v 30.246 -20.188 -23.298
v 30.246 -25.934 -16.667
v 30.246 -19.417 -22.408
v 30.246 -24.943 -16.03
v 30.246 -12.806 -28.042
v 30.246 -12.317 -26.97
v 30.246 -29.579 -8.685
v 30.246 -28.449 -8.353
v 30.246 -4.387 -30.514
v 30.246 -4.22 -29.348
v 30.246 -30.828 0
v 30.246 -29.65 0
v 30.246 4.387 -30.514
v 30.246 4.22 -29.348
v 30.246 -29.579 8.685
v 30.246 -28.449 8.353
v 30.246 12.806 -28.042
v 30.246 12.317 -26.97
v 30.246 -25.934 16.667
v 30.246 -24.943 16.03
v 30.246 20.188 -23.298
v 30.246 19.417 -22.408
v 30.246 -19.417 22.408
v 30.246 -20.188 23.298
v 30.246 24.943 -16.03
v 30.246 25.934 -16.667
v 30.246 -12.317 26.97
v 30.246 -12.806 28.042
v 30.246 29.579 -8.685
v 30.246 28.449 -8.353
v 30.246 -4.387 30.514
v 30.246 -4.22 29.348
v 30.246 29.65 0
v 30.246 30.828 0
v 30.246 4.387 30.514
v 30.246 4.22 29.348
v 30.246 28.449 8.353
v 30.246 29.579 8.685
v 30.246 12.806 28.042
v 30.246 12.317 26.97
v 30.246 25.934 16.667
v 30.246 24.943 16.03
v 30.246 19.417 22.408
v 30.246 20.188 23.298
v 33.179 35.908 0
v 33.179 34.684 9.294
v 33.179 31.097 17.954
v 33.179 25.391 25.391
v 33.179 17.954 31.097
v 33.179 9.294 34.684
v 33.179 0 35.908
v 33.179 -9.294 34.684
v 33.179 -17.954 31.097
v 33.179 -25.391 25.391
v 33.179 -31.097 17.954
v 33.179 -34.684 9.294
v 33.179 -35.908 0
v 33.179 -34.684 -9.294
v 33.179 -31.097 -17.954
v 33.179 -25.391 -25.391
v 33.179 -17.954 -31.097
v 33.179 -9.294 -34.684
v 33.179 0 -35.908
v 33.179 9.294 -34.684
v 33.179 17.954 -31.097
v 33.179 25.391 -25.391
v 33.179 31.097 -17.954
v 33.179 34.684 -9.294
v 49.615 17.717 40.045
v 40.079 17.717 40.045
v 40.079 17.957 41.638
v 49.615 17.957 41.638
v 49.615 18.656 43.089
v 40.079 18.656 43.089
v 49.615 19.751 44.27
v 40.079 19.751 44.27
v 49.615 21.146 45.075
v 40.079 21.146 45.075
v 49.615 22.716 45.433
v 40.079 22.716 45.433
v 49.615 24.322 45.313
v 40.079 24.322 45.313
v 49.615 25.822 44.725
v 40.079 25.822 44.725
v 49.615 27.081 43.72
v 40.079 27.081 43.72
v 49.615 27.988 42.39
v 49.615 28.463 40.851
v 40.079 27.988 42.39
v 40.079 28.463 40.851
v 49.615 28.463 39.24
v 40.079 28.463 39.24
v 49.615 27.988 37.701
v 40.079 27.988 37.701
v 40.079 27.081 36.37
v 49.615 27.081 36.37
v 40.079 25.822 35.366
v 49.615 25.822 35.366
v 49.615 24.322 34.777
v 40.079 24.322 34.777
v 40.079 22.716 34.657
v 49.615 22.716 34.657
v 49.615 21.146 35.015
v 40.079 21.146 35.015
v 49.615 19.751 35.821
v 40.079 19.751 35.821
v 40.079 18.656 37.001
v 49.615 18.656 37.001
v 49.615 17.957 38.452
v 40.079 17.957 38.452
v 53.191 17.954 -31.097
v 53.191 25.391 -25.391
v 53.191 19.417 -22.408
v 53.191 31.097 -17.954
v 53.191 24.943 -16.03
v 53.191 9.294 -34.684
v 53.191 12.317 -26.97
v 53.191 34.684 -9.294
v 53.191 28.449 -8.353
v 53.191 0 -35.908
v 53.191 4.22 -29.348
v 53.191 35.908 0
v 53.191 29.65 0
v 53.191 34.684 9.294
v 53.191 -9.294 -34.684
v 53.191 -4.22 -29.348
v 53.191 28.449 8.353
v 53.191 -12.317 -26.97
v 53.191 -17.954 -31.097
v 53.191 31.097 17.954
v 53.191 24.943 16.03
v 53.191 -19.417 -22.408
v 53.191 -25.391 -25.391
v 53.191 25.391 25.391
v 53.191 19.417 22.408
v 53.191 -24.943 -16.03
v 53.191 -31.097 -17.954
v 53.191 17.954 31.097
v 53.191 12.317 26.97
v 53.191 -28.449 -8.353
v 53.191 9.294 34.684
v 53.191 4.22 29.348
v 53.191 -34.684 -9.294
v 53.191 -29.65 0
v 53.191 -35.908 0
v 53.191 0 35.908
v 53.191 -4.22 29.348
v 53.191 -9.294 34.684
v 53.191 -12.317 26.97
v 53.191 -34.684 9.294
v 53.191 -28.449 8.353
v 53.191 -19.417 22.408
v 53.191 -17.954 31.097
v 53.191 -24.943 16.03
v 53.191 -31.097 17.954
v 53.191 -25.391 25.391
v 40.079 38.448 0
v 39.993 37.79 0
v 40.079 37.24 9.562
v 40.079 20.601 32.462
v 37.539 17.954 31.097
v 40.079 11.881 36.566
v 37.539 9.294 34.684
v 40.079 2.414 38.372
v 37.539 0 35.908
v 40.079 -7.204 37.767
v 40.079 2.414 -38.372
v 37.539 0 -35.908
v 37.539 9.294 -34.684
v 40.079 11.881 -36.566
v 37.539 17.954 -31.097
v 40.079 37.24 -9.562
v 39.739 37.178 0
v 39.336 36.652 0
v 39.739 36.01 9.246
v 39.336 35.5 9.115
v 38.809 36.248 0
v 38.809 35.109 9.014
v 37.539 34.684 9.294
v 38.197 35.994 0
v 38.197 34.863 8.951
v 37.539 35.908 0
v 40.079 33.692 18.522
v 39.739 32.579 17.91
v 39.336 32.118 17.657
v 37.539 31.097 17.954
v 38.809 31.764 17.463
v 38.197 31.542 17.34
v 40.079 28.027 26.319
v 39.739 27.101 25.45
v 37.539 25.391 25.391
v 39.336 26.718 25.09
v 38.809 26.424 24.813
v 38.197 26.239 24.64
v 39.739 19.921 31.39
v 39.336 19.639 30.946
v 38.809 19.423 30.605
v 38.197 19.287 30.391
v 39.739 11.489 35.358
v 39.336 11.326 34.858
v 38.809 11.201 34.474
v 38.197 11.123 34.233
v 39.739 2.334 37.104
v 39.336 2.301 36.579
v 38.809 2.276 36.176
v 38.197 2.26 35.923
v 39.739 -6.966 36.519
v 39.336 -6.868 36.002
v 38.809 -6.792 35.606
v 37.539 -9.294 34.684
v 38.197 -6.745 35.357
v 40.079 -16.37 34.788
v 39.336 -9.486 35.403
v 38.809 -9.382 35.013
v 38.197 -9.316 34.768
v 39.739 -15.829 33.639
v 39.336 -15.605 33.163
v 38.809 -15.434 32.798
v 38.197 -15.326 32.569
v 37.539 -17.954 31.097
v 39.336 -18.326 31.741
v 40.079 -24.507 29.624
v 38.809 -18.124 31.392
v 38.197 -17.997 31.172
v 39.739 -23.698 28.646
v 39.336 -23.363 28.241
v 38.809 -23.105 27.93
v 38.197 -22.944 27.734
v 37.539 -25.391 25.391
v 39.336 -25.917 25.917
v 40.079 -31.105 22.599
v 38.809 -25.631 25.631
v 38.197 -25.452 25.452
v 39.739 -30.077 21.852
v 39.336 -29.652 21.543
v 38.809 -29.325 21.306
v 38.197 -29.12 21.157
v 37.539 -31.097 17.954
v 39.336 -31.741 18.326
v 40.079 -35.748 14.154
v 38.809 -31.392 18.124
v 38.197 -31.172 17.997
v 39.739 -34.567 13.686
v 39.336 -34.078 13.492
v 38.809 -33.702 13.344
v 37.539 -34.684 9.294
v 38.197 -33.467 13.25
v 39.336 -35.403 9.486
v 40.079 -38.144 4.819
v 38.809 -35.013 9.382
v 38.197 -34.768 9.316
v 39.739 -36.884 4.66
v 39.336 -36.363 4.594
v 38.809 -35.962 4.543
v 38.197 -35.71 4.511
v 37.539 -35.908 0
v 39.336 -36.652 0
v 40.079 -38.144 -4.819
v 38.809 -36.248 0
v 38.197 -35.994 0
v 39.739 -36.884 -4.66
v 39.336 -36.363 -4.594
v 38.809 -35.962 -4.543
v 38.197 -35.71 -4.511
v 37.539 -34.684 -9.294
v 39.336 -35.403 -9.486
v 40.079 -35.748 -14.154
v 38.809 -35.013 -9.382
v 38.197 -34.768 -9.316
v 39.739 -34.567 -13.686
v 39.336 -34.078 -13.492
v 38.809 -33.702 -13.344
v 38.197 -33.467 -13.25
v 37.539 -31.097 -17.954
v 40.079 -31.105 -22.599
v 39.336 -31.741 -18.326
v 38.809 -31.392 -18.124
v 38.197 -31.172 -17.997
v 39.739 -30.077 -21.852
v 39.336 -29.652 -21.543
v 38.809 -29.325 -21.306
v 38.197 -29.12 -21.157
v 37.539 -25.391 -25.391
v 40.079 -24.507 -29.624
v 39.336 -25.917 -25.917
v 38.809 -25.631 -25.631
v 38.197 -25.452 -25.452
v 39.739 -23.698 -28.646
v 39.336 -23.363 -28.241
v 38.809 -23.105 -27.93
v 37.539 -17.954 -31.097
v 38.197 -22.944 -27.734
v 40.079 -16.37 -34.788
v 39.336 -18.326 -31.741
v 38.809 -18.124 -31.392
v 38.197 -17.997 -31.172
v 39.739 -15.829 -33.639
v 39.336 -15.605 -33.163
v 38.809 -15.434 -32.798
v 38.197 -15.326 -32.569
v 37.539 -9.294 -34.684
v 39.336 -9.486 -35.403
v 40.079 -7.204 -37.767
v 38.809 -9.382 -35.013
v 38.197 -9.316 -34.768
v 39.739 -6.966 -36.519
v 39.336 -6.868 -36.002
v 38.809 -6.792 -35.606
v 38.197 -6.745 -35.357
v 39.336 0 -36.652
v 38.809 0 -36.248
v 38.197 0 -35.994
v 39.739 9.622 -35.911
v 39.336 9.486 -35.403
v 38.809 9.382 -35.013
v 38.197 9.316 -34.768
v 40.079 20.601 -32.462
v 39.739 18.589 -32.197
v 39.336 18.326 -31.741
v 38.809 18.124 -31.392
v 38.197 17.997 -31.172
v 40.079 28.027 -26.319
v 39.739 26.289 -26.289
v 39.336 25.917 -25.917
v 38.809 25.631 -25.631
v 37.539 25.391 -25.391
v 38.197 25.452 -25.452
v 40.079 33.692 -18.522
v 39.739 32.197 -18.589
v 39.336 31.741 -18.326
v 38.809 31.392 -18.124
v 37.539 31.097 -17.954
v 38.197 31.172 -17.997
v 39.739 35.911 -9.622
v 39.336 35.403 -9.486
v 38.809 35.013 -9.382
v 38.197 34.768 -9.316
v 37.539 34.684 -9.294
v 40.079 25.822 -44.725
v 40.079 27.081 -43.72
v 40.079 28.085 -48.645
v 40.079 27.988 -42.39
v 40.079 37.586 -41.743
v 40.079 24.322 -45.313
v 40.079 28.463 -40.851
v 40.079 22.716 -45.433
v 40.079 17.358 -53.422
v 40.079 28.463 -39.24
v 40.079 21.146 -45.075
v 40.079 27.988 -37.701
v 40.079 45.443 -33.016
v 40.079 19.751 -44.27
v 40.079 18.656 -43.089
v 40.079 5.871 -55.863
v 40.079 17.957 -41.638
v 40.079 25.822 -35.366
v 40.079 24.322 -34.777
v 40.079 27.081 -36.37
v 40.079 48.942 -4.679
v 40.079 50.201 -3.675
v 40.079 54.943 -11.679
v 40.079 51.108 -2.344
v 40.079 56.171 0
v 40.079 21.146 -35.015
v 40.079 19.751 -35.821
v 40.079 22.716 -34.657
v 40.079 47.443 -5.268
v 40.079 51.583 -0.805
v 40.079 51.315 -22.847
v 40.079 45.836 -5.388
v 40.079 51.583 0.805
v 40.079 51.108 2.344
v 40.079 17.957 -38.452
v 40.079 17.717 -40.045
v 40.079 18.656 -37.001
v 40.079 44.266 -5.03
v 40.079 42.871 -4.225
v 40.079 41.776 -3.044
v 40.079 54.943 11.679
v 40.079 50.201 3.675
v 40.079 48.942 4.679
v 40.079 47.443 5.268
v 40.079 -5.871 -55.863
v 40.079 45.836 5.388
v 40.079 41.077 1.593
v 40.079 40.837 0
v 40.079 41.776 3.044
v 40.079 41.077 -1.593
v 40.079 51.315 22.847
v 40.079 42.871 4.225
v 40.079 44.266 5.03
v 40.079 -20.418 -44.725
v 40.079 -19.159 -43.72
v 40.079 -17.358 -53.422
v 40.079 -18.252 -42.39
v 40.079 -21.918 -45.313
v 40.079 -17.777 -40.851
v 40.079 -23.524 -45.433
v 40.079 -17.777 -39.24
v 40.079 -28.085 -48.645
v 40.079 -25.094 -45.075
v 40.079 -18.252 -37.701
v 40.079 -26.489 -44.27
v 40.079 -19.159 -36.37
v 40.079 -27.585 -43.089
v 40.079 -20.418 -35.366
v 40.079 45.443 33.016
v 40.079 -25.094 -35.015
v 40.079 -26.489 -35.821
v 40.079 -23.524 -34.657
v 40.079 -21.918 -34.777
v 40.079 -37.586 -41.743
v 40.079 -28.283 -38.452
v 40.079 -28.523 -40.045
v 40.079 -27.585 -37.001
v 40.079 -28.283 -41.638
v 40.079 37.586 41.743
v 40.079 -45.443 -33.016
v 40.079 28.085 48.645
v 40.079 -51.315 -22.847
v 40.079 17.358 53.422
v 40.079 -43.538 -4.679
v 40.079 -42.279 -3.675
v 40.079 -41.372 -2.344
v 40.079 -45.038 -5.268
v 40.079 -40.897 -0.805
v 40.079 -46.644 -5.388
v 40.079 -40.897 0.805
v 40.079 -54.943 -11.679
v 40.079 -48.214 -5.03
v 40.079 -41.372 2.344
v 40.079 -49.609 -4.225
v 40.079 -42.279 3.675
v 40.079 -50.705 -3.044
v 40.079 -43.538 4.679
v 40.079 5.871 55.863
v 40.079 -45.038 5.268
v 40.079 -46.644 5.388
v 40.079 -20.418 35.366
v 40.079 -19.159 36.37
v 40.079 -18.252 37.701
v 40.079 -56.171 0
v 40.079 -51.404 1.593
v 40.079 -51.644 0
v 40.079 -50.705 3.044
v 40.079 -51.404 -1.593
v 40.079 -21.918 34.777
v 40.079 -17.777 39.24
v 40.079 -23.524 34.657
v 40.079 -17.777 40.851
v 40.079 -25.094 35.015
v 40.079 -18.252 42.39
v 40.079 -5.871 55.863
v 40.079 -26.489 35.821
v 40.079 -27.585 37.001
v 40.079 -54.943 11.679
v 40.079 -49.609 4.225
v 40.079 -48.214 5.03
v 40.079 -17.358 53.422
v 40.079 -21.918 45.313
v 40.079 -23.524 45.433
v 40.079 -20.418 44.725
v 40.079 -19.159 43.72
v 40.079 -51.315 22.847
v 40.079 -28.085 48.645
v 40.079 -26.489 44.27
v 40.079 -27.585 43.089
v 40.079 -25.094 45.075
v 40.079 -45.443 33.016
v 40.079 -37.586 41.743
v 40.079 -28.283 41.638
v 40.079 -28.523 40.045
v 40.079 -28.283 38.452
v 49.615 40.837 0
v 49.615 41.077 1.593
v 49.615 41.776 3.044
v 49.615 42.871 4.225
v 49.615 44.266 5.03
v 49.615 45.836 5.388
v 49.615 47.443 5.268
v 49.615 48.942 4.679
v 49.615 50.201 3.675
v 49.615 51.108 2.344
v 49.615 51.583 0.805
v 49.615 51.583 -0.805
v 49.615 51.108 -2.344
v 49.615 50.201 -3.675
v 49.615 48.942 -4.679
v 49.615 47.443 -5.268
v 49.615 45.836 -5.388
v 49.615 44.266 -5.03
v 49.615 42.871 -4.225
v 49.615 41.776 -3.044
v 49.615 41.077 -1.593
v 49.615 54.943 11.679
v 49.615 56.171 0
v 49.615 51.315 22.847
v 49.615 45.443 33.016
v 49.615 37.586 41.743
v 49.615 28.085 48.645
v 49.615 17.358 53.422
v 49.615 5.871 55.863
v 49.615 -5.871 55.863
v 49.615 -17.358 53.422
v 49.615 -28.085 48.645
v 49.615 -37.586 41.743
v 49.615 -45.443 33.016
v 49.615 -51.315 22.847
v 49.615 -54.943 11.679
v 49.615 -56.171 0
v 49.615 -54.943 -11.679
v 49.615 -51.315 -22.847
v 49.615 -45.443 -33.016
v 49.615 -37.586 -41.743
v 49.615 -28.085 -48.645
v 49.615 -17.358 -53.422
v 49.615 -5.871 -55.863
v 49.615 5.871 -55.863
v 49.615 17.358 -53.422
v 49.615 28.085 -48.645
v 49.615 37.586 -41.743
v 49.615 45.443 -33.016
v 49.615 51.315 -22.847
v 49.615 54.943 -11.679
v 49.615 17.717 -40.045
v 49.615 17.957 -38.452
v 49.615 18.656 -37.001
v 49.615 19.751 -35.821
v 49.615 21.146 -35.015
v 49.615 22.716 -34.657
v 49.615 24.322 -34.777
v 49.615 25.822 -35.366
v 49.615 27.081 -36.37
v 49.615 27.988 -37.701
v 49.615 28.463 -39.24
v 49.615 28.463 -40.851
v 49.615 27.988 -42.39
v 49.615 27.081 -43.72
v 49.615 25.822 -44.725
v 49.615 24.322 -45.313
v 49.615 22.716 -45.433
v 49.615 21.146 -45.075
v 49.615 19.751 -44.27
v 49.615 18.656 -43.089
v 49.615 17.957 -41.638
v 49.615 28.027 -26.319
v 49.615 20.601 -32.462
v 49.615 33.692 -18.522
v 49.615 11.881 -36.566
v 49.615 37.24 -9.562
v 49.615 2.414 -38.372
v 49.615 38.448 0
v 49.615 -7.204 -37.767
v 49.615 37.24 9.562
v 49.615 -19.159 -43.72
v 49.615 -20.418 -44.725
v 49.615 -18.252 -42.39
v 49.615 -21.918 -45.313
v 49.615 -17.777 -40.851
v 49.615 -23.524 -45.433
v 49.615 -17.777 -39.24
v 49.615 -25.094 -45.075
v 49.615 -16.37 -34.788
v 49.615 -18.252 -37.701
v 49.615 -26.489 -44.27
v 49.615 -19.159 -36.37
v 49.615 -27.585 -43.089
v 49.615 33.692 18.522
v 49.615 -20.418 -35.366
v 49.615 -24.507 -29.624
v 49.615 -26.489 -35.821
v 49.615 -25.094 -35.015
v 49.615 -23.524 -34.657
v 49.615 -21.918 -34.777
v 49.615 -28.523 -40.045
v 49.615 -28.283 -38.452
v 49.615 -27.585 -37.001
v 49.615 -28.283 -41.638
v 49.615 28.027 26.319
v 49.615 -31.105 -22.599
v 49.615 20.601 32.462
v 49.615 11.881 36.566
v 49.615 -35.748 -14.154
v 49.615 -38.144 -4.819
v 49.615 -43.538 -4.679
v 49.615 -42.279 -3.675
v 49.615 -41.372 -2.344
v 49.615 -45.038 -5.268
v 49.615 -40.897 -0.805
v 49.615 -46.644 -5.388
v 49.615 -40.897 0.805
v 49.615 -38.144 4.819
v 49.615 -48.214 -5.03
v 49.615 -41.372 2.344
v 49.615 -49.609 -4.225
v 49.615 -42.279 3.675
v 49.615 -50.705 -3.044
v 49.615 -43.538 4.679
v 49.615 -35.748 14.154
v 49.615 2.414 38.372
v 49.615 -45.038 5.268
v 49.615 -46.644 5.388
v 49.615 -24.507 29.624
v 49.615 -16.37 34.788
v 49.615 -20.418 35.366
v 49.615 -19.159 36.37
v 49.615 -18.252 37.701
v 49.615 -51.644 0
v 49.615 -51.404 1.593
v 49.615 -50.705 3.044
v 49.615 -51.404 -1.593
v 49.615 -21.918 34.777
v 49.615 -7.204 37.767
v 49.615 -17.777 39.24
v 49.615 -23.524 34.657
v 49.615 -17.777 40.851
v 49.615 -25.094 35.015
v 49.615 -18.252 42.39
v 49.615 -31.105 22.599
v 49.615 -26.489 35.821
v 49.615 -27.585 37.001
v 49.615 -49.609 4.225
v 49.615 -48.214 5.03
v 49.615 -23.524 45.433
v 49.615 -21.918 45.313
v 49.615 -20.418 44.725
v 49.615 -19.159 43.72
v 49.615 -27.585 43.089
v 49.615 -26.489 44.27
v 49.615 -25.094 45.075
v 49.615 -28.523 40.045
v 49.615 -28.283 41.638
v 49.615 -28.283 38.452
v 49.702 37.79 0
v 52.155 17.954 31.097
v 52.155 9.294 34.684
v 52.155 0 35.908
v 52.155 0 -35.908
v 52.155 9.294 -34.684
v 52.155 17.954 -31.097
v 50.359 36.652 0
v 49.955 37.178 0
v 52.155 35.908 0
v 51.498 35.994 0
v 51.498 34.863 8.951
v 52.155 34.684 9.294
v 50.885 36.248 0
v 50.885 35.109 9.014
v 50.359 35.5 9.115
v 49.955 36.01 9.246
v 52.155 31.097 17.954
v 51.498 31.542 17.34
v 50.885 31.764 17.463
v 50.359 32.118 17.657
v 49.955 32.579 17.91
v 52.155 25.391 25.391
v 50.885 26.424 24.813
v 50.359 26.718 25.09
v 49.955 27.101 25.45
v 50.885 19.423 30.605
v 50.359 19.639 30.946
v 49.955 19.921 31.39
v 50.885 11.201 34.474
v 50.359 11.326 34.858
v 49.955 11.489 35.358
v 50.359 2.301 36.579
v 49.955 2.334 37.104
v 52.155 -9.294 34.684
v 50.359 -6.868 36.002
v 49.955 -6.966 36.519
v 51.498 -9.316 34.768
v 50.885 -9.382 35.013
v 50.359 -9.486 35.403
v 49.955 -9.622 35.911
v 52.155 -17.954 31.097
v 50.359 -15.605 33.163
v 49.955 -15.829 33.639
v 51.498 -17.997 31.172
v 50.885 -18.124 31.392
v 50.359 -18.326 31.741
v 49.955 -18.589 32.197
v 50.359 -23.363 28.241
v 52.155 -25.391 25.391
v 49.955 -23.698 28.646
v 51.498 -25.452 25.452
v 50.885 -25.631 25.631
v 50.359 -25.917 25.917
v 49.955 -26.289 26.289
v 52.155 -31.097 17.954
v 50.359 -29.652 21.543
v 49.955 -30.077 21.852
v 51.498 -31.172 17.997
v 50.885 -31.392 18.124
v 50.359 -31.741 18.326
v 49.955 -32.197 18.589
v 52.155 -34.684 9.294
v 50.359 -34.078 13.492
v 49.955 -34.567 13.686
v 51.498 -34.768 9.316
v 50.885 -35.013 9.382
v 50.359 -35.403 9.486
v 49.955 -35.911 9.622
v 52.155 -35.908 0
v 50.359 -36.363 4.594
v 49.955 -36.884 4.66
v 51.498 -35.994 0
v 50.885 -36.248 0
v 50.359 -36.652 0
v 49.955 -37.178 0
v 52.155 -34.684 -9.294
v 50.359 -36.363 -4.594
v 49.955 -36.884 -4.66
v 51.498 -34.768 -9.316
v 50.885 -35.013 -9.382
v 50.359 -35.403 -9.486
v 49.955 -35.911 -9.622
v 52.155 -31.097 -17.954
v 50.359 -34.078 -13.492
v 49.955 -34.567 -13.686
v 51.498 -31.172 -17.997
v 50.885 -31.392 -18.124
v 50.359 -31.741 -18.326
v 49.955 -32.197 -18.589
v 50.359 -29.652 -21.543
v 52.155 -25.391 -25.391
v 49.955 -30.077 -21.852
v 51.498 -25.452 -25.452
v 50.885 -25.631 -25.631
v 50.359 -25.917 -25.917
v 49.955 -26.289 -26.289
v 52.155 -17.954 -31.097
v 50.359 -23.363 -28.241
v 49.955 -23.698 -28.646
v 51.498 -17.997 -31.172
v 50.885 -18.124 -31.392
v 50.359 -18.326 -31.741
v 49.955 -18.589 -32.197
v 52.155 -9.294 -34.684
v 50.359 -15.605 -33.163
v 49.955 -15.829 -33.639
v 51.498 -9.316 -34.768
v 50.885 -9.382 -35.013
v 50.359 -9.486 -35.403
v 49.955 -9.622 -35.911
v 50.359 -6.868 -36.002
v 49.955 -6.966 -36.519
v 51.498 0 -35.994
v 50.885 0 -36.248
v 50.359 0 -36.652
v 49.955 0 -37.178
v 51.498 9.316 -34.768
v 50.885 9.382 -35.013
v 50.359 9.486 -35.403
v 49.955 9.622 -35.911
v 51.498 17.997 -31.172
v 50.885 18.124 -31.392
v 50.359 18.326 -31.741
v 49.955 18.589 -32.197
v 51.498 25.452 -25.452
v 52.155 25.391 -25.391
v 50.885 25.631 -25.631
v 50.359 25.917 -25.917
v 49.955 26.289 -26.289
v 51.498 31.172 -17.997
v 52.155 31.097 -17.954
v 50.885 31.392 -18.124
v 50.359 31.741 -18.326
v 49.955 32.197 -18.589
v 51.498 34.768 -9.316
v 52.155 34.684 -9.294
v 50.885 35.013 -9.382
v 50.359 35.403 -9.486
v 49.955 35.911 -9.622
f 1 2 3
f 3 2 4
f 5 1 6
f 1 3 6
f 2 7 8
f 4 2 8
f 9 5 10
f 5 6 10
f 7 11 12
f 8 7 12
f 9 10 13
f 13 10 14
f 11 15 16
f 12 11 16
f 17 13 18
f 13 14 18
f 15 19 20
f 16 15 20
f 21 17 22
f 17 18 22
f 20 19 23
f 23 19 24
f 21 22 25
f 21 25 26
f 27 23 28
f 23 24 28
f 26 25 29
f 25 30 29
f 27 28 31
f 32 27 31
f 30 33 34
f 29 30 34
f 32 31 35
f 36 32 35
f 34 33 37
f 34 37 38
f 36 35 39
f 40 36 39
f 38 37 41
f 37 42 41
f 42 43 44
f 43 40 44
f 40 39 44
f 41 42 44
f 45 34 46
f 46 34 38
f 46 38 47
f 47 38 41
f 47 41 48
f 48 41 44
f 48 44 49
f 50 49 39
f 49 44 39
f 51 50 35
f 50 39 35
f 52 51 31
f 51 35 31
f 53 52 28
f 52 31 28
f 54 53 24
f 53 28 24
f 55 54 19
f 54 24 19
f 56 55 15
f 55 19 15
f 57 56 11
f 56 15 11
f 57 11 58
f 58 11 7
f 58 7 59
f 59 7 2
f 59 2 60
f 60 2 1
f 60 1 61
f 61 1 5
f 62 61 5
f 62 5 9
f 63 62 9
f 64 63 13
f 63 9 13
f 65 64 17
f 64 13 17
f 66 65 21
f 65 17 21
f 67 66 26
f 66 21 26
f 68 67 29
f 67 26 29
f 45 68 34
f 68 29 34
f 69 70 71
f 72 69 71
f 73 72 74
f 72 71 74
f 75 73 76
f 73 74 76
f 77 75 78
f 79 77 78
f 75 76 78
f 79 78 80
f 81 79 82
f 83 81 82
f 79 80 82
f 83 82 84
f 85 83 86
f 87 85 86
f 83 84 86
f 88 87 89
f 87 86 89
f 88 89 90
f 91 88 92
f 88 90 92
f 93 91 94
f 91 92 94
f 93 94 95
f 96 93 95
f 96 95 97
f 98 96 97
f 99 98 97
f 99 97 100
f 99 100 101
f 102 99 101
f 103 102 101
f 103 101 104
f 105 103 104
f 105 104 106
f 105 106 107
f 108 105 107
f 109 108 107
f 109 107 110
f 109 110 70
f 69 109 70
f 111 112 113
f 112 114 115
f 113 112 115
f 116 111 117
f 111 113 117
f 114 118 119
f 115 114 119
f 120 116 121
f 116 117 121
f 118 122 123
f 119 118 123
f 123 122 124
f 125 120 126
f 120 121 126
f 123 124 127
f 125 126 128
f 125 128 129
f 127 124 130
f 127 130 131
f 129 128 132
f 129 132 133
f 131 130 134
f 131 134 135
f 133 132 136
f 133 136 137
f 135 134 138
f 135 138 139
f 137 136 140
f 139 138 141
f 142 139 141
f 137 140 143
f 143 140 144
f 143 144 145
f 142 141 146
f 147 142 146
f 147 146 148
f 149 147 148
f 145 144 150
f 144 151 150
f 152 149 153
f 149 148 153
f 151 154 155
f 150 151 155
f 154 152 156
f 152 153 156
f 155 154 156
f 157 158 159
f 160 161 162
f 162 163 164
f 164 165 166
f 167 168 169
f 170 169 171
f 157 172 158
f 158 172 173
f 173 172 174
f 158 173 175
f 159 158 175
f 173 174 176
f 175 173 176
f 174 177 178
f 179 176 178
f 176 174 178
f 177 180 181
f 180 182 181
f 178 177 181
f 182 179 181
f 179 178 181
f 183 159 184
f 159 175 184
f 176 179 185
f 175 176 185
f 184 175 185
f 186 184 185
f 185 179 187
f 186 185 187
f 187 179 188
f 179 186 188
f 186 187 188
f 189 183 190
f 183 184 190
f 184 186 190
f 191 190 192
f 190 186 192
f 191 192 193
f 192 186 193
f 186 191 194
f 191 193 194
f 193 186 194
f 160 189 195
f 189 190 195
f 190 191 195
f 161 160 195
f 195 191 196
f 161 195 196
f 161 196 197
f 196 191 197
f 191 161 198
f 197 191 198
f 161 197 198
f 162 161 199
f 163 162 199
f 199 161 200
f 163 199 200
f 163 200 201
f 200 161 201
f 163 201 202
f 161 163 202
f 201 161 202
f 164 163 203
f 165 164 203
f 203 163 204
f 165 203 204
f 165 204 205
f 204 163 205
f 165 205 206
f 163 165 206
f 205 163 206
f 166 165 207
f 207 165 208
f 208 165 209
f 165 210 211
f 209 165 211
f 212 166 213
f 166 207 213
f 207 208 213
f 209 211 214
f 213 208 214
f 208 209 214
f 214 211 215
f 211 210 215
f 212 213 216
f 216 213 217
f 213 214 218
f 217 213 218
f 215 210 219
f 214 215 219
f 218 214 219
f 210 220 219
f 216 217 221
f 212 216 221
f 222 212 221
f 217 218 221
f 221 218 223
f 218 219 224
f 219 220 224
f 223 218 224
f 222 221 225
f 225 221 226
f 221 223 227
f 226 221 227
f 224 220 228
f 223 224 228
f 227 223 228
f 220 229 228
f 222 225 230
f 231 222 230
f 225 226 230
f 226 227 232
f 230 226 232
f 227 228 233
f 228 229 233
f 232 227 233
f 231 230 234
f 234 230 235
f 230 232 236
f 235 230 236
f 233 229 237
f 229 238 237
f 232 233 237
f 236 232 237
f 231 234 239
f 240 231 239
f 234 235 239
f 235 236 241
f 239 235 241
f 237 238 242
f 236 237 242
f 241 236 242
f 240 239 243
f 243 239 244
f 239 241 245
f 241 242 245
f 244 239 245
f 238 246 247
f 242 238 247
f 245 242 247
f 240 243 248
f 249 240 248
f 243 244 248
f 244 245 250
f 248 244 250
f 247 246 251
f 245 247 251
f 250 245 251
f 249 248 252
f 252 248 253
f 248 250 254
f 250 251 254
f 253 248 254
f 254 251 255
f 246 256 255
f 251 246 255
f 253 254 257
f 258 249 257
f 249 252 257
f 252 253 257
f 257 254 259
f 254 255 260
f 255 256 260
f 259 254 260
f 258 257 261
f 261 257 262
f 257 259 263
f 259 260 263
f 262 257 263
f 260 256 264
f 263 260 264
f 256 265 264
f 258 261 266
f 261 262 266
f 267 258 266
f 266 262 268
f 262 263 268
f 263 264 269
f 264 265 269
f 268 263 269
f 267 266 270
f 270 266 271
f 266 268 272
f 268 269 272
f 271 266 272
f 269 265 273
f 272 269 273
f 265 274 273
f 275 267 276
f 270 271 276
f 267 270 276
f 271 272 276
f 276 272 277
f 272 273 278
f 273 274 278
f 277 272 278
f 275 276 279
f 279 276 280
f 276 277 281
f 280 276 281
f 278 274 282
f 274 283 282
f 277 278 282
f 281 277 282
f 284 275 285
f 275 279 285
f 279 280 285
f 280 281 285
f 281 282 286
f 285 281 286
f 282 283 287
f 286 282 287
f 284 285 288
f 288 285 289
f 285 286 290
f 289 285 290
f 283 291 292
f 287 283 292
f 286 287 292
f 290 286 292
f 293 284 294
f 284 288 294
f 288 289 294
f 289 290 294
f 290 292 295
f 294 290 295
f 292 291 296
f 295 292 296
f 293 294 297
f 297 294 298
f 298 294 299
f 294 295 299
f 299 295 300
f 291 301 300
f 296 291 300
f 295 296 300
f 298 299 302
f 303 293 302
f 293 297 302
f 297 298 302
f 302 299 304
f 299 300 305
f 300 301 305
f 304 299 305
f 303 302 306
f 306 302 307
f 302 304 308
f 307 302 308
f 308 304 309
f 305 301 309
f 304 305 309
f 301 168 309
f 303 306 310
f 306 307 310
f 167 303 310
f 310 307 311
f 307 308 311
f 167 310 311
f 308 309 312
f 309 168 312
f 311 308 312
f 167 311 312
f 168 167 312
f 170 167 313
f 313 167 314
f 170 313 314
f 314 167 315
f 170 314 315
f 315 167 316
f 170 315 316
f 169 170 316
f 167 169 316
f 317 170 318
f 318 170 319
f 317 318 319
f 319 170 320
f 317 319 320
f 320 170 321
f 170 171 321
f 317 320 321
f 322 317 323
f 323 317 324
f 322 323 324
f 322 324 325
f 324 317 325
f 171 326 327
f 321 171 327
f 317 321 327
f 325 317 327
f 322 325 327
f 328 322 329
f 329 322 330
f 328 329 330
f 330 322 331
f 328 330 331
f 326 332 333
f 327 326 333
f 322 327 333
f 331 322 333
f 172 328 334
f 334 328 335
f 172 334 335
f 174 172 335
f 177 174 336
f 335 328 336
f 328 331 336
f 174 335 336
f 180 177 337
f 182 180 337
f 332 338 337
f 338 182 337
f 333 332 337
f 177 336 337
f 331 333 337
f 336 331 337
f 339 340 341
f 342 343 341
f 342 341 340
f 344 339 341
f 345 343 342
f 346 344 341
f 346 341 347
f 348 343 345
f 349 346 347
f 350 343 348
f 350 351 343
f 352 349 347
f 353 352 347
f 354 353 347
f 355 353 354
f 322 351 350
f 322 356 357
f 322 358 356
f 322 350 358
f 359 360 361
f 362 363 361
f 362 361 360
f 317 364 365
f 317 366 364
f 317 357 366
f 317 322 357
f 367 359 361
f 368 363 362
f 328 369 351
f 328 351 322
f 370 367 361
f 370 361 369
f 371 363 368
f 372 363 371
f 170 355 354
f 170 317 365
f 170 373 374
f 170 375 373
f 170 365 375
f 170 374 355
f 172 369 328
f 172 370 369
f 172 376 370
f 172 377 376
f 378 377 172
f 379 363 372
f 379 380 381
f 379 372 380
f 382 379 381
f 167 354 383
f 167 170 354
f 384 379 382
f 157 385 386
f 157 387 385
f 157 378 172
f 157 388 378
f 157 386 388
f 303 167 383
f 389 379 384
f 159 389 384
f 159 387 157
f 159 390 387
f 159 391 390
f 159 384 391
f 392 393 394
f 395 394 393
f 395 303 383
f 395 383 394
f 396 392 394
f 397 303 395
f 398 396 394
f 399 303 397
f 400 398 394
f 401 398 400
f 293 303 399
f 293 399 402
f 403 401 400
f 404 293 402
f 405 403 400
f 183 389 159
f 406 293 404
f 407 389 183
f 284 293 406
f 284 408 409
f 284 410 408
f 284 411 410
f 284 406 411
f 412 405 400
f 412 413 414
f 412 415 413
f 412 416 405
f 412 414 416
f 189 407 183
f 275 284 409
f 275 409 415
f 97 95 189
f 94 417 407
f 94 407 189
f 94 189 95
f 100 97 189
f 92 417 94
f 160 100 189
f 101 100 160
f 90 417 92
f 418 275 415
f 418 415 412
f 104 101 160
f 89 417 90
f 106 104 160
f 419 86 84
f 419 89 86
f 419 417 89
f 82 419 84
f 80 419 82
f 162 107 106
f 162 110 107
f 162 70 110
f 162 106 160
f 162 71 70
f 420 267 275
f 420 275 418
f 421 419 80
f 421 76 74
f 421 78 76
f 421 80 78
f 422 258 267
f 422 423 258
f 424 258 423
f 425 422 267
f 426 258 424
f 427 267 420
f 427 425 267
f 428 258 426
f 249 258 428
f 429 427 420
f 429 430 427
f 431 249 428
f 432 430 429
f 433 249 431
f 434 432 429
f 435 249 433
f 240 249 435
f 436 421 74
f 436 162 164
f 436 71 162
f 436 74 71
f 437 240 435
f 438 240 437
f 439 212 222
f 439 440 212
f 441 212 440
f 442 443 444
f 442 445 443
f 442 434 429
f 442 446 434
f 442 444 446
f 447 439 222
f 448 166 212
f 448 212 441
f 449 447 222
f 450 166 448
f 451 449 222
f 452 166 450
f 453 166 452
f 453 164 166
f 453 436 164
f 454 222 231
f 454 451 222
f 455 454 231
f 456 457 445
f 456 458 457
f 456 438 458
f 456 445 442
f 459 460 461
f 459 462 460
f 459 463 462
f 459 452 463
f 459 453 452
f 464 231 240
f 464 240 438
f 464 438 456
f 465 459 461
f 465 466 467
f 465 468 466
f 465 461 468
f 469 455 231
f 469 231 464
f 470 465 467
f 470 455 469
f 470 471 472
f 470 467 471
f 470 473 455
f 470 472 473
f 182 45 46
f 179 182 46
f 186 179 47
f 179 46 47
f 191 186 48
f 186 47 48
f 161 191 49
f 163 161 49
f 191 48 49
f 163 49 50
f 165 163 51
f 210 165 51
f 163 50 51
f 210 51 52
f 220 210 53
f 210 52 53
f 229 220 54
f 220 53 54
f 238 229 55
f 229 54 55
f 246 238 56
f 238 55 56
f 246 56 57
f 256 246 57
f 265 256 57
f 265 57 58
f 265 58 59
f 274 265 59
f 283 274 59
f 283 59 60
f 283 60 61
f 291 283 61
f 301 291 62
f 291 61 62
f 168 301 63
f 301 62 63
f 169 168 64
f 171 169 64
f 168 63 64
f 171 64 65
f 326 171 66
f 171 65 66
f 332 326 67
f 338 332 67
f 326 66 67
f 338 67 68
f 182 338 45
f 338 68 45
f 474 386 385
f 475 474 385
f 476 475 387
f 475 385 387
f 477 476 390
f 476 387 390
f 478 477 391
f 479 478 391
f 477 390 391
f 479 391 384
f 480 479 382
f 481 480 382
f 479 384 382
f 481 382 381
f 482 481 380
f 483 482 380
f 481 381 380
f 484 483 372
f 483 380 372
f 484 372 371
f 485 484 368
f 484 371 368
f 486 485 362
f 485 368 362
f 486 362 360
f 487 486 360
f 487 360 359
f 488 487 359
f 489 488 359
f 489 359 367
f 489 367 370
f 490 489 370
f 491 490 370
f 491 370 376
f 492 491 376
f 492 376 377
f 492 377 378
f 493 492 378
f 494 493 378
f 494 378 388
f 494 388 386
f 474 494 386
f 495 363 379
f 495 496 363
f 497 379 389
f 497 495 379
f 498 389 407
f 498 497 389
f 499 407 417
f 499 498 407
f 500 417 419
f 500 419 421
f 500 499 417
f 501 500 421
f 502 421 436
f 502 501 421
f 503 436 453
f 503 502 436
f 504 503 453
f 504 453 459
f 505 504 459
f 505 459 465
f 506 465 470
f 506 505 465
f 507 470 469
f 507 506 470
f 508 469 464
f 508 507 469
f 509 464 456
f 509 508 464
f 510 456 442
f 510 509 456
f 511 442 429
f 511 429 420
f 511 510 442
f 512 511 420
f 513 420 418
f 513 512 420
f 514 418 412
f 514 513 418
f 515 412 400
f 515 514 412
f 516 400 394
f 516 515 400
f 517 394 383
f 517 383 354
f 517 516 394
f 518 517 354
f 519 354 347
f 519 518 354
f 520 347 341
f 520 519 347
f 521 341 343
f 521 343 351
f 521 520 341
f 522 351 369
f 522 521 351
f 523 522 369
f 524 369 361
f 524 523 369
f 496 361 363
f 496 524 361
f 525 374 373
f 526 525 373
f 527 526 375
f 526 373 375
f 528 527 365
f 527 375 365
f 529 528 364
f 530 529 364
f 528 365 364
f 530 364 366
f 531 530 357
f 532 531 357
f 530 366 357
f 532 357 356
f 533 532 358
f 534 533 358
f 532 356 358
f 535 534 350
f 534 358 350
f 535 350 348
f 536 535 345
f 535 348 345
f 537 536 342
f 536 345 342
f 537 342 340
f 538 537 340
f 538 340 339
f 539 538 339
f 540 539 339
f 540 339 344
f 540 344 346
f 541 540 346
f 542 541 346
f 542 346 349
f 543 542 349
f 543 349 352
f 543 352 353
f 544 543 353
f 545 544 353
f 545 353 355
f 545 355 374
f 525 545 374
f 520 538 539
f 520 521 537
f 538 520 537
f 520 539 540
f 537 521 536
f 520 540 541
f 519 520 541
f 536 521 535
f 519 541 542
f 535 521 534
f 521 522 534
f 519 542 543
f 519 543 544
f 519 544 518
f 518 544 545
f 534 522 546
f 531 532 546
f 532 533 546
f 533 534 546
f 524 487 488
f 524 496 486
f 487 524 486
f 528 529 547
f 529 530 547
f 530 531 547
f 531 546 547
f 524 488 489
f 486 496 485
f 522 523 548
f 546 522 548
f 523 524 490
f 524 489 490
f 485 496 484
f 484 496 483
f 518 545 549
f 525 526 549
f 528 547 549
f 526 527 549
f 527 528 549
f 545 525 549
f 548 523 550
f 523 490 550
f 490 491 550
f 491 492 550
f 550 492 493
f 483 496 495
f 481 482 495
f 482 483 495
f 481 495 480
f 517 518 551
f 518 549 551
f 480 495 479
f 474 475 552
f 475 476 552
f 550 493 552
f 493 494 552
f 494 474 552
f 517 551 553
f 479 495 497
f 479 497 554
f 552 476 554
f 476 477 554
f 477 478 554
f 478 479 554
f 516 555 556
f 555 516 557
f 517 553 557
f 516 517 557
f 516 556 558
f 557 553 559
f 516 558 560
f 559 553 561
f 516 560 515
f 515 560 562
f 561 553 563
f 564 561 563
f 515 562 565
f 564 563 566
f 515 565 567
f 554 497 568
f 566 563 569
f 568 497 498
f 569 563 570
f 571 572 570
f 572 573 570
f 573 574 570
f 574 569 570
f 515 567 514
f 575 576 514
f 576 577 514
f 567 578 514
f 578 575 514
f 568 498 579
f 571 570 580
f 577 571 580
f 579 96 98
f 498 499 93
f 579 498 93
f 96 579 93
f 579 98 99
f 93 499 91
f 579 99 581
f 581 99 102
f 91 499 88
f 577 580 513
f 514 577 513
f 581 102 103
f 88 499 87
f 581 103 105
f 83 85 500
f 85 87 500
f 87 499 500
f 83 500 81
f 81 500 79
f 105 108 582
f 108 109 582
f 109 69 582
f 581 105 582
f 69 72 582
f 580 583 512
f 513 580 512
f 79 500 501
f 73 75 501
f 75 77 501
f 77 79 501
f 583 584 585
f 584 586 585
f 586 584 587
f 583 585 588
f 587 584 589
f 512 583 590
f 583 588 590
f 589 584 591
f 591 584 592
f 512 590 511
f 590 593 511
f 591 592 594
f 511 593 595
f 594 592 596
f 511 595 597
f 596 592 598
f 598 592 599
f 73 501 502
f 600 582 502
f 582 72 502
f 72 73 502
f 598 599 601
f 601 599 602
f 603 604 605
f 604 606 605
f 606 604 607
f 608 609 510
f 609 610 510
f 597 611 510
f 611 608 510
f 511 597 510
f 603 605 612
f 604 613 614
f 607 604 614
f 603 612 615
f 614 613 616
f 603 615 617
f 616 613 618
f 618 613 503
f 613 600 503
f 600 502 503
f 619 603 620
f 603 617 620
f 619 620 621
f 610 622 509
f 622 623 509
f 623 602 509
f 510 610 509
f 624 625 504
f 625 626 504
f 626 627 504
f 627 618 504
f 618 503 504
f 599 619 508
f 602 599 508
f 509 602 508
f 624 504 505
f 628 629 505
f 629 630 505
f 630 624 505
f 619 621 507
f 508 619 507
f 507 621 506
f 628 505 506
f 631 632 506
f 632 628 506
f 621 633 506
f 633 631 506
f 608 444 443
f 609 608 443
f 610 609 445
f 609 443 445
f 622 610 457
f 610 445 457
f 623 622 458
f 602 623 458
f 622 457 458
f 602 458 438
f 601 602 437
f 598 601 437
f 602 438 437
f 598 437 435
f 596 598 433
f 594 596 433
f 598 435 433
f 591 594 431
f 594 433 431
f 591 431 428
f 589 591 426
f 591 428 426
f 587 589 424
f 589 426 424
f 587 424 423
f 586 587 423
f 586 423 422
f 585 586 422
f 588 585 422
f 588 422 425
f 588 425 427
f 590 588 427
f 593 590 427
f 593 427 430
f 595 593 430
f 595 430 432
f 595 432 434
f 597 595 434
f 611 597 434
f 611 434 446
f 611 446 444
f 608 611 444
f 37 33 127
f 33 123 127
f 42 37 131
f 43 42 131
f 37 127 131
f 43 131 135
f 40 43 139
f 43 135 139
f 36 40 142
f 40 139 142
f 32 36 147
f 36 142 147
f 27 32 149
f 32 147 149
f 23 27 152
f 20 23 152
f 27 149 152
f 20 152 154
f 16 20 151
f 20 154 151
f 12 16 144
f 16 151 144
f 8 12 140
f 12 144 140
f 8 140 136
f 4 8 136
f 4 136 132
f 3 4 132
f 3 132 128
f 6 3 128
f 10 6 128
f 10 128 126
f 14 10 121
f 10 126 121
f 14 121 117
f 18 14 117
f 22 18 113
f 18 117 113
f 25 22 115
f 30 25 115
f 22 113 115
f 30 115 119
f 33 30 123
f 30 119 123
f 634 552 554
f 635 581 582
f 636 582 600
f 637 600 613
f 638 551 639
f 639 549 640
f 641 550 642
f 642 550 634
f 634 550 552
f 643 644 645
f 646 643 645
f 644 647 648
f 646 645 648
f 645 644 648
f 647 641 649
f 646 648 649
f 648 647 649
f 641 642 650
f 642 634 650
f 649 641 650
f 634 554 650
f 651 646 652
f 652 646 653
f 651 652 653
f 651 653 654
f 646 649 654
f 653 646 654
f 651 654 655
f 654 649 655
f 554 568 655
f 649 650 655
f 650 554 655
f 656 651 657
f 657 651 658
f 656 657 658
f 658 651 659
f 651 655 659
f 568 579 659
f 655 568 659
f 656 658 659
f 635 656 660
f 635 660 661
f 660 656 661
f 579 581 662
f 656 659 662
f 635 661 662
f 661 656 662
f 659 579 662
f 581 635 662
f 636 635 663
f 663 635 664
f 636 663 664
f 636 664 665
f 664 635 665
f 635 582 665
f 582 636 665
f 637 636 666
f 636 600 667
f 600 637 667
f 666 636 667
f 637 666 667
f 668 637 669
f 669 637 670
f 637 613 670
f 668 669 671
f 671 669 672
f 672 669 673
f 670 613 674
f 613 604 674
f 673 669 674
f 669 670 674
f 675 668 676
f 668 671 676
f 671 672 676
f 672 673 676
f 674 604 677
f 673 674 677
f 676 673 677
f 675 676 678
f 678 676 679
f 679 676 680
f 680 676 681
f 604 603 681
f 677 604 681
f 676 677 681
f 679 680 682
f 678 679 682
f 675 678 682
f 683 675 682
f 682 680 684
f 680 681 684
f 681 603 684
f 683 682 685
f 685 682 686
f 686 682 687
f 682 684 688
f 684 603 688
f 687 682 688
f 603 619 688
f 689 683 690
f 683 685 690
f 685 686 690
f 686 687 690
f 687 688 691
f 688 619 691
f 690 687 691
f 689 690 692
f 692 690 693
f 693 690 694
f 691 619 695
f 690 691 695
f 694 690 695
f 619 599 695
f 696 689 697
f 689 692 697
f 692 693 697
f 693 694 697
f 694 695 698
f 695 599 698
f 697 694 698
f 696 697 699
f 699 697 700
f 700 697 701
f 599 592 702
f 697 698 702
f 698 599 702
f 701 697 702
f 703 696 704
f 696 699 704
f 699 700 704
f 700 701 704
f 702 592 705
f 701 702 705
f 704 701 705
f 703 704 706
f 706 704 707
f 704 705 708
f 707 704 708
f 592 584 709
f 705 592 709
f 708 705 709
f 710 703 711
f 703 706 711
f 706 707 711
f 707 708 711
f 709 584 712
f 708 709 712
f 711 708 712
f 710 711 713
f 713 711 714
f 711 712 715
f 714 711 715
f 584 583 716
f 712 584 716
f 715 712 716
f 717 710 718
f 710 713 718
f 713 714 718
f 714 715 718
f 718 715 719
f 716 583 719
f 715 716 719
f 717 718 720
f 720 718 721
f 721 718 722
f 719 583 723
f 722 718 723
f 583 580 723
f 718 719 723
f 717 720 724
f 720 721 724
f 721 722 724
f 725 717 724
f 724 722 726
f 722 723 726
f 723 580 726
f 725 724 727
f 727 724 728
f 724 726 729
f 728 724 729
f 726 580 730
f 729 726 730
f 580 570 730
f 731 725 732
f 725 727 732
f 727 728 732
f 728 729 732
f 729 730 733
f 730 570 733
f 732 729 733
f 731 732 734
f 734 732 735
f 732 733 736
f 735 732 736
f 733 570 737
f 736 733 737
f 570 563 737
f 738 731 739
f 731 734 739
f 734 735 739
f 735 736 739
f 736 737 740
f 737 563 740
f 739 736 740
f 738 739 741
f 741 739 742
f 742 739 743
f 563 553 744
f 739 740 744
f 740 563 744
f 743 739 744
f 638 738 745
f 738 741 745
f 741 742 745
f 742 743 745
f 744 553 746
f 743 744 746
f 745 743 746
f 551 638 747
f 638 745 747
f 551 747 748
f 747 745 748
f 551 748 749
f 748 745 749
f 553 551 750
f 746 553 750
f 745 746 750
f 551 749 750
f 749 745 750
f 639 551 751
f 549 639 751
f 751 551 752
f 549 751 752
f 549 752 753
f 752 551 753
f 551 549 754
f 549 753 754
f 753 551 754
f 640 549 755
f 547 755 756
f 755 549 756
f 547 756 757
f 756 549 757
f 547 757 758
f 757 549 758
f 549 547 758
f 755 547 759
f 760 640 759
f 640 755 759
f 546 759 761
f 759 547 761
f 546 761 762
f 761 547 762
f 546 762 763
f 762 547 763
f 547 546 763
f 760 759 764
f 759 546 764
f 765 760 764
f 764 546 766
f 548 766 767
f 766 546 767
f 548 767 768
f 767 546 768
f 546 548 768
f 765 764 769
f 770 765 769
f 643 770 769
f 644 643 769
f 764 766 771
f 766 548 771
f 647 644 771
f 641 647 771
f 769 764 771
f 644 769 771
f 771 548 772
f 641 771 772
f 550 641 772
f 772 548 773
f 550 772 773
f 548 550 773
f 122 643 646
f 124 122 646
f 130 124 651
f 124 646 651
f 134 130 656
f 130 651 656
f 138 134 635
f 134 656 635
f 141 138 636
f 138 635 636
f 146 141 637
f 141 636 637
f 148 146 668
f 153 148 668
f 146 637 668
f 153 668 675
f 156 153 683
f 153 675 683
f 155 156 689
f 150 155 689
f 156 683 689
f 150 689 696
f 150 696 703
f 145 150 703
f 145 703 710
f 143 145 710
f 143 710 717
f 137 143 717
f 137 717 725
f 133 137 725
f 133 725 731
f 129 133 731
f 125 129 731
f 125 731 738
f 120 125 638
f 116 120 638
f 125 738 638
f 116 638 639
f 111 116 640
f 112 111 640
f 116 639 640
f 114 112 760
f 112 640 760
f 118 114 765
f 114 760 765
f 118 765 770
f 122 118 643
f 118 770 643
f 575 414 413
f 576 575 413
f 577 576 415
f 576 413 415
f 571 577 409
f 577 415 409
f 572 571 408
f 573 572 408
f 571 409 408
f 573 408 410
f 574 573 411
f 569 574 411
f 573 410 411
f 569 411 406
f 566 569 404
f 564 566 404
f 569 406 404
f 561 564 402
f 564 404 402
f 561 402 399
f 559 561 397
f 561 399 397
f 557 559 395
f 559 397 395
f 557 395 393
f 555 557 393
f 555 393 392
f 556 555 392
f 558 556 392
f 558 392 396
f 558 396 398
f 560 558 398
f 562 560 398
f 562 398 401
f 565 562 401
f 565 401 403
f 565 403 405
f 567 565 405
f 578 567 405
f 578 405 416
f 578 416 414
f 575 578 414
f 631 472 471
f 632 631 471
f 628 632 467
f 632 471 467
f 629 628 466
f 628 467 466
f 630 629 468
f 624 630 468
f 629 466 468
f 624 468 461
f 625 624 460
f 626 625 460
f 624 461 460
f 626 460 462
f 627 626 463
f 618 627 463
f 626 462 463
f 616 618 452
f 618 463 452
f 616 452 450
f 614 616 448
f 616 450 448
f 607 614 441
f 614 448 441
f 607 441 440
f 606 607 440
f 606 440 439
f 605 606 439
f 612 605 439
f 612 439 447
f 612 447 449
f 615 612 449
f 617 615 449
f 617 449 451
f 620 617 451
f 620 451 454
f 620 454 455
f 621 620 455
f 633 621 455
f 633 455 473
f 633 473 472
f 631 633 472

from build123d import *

# Parameters (mm, degrees)
F1_W          = 9.5356404781
F1_H          = 20.2632434666
F3_R          = 2.54
F4_R          = 2.54
F5_SIZE2      = 5.08
F5_SIZE       = 2.9329393675
F6_R          = 5.4033891953
F7_DEPTH      = 25.4
F7_DEPTH_BACK = 25.4
F8_DEPTH      = 25.4
F8_DEPTH_BACK = 25.4


with BuildPart() as f2:
    # F1 (on Top) → F2 (revolve)
    with BuildSketch(Plane.XY):
        with Locations((44.84731704, 46.0392739624)):
            Rectangle(F1_W, F1_H)
        Polygon((49.615137279, 35.9076522291), (40.0794968009, 35.9076522291), (30.2458684891, 35.9076522291), (30.2458684891, 29.6498890966), (53.1910024583, 29.6498890966), (53.1910024583, 35.9076522291), align=None)
    revolve(axis=Axis((0.2979896963, 0, 0), (1, 0, 0)))

    # F3
    f3_edges = [f2.edges().sort_by_distance(p)[0] for p in [
        (49.615137, -35.907652, 0),
    ]]
    fillet(f3_edges, radius=F3_R)

    # F4
    f4_edges = [f2.edges().sort_by_distance(p)[0] for p in [
        (40.079497, -35.907652, 0),
    ]]
    fillet(f4_edges, radius=F4_R)

    # F5
    f5_edges = [f2.edges().sort_by_distance(p)[0] for p in [
        (30.245868, -35.907652, 0),
    ]]
    f5_side = f2.faces().sort_by_distance((33.892683, -35.907652, 0))[0]
    chamfer(f5_edges, length=F5_SIZE, length2=F5_SIZE2, reference=f5_side)

    # F6 (on face) → F7 (cut, two sides)
    with BuildSketch(Plane(origin=(40.0794968009, 0, 0), x_dir=(0, -1, 0), z_dir=(-1, 0, 0))) as f7_sk:
        with Locations((-46.2401774935, 0)):
            Circle(F6_R)
    extrude(amount=F7_DEPTH, mode=Mode.SUBTRACT)
    extrude(f7_sk.sketch, amount=-F7_DEPTH_BACK, mode=Mode.SUBTRACT)

    # F6 (on face) → F8 (cut, two sides)
    with BuildSketch(Plane(origin=(40.0794968009, 0, 0), x_dir=(0, -1, 0), z_dir=(-1, 0, 0))) as f8_sk:
        with Locations((-46.2401774935, 0)):
            Circle(F6_R)
        with Locations((-23.1200887467, -40.0451683849)):
            Circle(F6_R)
        with Locations((23.1200887467, -40.0451683849)):
            Circle(F6_R)
        with Locations((46.2401774935, 0)):
            Circle(F6_R)
        with Locations((23.1200887467, 40.0451683849)):
            Circle(F6_R)
        with Locations((-23.1200887467, 40.0451683849)):
            Circle(F6_R)
    extrude(amount=-F8_DEPTH, mode=Mode.SUBTRACT)
    extrude(f8_sk.sketch, amount=F8_DEPTH_BACK, mode=Mode.SUBTRACT)


solid = f2.part
